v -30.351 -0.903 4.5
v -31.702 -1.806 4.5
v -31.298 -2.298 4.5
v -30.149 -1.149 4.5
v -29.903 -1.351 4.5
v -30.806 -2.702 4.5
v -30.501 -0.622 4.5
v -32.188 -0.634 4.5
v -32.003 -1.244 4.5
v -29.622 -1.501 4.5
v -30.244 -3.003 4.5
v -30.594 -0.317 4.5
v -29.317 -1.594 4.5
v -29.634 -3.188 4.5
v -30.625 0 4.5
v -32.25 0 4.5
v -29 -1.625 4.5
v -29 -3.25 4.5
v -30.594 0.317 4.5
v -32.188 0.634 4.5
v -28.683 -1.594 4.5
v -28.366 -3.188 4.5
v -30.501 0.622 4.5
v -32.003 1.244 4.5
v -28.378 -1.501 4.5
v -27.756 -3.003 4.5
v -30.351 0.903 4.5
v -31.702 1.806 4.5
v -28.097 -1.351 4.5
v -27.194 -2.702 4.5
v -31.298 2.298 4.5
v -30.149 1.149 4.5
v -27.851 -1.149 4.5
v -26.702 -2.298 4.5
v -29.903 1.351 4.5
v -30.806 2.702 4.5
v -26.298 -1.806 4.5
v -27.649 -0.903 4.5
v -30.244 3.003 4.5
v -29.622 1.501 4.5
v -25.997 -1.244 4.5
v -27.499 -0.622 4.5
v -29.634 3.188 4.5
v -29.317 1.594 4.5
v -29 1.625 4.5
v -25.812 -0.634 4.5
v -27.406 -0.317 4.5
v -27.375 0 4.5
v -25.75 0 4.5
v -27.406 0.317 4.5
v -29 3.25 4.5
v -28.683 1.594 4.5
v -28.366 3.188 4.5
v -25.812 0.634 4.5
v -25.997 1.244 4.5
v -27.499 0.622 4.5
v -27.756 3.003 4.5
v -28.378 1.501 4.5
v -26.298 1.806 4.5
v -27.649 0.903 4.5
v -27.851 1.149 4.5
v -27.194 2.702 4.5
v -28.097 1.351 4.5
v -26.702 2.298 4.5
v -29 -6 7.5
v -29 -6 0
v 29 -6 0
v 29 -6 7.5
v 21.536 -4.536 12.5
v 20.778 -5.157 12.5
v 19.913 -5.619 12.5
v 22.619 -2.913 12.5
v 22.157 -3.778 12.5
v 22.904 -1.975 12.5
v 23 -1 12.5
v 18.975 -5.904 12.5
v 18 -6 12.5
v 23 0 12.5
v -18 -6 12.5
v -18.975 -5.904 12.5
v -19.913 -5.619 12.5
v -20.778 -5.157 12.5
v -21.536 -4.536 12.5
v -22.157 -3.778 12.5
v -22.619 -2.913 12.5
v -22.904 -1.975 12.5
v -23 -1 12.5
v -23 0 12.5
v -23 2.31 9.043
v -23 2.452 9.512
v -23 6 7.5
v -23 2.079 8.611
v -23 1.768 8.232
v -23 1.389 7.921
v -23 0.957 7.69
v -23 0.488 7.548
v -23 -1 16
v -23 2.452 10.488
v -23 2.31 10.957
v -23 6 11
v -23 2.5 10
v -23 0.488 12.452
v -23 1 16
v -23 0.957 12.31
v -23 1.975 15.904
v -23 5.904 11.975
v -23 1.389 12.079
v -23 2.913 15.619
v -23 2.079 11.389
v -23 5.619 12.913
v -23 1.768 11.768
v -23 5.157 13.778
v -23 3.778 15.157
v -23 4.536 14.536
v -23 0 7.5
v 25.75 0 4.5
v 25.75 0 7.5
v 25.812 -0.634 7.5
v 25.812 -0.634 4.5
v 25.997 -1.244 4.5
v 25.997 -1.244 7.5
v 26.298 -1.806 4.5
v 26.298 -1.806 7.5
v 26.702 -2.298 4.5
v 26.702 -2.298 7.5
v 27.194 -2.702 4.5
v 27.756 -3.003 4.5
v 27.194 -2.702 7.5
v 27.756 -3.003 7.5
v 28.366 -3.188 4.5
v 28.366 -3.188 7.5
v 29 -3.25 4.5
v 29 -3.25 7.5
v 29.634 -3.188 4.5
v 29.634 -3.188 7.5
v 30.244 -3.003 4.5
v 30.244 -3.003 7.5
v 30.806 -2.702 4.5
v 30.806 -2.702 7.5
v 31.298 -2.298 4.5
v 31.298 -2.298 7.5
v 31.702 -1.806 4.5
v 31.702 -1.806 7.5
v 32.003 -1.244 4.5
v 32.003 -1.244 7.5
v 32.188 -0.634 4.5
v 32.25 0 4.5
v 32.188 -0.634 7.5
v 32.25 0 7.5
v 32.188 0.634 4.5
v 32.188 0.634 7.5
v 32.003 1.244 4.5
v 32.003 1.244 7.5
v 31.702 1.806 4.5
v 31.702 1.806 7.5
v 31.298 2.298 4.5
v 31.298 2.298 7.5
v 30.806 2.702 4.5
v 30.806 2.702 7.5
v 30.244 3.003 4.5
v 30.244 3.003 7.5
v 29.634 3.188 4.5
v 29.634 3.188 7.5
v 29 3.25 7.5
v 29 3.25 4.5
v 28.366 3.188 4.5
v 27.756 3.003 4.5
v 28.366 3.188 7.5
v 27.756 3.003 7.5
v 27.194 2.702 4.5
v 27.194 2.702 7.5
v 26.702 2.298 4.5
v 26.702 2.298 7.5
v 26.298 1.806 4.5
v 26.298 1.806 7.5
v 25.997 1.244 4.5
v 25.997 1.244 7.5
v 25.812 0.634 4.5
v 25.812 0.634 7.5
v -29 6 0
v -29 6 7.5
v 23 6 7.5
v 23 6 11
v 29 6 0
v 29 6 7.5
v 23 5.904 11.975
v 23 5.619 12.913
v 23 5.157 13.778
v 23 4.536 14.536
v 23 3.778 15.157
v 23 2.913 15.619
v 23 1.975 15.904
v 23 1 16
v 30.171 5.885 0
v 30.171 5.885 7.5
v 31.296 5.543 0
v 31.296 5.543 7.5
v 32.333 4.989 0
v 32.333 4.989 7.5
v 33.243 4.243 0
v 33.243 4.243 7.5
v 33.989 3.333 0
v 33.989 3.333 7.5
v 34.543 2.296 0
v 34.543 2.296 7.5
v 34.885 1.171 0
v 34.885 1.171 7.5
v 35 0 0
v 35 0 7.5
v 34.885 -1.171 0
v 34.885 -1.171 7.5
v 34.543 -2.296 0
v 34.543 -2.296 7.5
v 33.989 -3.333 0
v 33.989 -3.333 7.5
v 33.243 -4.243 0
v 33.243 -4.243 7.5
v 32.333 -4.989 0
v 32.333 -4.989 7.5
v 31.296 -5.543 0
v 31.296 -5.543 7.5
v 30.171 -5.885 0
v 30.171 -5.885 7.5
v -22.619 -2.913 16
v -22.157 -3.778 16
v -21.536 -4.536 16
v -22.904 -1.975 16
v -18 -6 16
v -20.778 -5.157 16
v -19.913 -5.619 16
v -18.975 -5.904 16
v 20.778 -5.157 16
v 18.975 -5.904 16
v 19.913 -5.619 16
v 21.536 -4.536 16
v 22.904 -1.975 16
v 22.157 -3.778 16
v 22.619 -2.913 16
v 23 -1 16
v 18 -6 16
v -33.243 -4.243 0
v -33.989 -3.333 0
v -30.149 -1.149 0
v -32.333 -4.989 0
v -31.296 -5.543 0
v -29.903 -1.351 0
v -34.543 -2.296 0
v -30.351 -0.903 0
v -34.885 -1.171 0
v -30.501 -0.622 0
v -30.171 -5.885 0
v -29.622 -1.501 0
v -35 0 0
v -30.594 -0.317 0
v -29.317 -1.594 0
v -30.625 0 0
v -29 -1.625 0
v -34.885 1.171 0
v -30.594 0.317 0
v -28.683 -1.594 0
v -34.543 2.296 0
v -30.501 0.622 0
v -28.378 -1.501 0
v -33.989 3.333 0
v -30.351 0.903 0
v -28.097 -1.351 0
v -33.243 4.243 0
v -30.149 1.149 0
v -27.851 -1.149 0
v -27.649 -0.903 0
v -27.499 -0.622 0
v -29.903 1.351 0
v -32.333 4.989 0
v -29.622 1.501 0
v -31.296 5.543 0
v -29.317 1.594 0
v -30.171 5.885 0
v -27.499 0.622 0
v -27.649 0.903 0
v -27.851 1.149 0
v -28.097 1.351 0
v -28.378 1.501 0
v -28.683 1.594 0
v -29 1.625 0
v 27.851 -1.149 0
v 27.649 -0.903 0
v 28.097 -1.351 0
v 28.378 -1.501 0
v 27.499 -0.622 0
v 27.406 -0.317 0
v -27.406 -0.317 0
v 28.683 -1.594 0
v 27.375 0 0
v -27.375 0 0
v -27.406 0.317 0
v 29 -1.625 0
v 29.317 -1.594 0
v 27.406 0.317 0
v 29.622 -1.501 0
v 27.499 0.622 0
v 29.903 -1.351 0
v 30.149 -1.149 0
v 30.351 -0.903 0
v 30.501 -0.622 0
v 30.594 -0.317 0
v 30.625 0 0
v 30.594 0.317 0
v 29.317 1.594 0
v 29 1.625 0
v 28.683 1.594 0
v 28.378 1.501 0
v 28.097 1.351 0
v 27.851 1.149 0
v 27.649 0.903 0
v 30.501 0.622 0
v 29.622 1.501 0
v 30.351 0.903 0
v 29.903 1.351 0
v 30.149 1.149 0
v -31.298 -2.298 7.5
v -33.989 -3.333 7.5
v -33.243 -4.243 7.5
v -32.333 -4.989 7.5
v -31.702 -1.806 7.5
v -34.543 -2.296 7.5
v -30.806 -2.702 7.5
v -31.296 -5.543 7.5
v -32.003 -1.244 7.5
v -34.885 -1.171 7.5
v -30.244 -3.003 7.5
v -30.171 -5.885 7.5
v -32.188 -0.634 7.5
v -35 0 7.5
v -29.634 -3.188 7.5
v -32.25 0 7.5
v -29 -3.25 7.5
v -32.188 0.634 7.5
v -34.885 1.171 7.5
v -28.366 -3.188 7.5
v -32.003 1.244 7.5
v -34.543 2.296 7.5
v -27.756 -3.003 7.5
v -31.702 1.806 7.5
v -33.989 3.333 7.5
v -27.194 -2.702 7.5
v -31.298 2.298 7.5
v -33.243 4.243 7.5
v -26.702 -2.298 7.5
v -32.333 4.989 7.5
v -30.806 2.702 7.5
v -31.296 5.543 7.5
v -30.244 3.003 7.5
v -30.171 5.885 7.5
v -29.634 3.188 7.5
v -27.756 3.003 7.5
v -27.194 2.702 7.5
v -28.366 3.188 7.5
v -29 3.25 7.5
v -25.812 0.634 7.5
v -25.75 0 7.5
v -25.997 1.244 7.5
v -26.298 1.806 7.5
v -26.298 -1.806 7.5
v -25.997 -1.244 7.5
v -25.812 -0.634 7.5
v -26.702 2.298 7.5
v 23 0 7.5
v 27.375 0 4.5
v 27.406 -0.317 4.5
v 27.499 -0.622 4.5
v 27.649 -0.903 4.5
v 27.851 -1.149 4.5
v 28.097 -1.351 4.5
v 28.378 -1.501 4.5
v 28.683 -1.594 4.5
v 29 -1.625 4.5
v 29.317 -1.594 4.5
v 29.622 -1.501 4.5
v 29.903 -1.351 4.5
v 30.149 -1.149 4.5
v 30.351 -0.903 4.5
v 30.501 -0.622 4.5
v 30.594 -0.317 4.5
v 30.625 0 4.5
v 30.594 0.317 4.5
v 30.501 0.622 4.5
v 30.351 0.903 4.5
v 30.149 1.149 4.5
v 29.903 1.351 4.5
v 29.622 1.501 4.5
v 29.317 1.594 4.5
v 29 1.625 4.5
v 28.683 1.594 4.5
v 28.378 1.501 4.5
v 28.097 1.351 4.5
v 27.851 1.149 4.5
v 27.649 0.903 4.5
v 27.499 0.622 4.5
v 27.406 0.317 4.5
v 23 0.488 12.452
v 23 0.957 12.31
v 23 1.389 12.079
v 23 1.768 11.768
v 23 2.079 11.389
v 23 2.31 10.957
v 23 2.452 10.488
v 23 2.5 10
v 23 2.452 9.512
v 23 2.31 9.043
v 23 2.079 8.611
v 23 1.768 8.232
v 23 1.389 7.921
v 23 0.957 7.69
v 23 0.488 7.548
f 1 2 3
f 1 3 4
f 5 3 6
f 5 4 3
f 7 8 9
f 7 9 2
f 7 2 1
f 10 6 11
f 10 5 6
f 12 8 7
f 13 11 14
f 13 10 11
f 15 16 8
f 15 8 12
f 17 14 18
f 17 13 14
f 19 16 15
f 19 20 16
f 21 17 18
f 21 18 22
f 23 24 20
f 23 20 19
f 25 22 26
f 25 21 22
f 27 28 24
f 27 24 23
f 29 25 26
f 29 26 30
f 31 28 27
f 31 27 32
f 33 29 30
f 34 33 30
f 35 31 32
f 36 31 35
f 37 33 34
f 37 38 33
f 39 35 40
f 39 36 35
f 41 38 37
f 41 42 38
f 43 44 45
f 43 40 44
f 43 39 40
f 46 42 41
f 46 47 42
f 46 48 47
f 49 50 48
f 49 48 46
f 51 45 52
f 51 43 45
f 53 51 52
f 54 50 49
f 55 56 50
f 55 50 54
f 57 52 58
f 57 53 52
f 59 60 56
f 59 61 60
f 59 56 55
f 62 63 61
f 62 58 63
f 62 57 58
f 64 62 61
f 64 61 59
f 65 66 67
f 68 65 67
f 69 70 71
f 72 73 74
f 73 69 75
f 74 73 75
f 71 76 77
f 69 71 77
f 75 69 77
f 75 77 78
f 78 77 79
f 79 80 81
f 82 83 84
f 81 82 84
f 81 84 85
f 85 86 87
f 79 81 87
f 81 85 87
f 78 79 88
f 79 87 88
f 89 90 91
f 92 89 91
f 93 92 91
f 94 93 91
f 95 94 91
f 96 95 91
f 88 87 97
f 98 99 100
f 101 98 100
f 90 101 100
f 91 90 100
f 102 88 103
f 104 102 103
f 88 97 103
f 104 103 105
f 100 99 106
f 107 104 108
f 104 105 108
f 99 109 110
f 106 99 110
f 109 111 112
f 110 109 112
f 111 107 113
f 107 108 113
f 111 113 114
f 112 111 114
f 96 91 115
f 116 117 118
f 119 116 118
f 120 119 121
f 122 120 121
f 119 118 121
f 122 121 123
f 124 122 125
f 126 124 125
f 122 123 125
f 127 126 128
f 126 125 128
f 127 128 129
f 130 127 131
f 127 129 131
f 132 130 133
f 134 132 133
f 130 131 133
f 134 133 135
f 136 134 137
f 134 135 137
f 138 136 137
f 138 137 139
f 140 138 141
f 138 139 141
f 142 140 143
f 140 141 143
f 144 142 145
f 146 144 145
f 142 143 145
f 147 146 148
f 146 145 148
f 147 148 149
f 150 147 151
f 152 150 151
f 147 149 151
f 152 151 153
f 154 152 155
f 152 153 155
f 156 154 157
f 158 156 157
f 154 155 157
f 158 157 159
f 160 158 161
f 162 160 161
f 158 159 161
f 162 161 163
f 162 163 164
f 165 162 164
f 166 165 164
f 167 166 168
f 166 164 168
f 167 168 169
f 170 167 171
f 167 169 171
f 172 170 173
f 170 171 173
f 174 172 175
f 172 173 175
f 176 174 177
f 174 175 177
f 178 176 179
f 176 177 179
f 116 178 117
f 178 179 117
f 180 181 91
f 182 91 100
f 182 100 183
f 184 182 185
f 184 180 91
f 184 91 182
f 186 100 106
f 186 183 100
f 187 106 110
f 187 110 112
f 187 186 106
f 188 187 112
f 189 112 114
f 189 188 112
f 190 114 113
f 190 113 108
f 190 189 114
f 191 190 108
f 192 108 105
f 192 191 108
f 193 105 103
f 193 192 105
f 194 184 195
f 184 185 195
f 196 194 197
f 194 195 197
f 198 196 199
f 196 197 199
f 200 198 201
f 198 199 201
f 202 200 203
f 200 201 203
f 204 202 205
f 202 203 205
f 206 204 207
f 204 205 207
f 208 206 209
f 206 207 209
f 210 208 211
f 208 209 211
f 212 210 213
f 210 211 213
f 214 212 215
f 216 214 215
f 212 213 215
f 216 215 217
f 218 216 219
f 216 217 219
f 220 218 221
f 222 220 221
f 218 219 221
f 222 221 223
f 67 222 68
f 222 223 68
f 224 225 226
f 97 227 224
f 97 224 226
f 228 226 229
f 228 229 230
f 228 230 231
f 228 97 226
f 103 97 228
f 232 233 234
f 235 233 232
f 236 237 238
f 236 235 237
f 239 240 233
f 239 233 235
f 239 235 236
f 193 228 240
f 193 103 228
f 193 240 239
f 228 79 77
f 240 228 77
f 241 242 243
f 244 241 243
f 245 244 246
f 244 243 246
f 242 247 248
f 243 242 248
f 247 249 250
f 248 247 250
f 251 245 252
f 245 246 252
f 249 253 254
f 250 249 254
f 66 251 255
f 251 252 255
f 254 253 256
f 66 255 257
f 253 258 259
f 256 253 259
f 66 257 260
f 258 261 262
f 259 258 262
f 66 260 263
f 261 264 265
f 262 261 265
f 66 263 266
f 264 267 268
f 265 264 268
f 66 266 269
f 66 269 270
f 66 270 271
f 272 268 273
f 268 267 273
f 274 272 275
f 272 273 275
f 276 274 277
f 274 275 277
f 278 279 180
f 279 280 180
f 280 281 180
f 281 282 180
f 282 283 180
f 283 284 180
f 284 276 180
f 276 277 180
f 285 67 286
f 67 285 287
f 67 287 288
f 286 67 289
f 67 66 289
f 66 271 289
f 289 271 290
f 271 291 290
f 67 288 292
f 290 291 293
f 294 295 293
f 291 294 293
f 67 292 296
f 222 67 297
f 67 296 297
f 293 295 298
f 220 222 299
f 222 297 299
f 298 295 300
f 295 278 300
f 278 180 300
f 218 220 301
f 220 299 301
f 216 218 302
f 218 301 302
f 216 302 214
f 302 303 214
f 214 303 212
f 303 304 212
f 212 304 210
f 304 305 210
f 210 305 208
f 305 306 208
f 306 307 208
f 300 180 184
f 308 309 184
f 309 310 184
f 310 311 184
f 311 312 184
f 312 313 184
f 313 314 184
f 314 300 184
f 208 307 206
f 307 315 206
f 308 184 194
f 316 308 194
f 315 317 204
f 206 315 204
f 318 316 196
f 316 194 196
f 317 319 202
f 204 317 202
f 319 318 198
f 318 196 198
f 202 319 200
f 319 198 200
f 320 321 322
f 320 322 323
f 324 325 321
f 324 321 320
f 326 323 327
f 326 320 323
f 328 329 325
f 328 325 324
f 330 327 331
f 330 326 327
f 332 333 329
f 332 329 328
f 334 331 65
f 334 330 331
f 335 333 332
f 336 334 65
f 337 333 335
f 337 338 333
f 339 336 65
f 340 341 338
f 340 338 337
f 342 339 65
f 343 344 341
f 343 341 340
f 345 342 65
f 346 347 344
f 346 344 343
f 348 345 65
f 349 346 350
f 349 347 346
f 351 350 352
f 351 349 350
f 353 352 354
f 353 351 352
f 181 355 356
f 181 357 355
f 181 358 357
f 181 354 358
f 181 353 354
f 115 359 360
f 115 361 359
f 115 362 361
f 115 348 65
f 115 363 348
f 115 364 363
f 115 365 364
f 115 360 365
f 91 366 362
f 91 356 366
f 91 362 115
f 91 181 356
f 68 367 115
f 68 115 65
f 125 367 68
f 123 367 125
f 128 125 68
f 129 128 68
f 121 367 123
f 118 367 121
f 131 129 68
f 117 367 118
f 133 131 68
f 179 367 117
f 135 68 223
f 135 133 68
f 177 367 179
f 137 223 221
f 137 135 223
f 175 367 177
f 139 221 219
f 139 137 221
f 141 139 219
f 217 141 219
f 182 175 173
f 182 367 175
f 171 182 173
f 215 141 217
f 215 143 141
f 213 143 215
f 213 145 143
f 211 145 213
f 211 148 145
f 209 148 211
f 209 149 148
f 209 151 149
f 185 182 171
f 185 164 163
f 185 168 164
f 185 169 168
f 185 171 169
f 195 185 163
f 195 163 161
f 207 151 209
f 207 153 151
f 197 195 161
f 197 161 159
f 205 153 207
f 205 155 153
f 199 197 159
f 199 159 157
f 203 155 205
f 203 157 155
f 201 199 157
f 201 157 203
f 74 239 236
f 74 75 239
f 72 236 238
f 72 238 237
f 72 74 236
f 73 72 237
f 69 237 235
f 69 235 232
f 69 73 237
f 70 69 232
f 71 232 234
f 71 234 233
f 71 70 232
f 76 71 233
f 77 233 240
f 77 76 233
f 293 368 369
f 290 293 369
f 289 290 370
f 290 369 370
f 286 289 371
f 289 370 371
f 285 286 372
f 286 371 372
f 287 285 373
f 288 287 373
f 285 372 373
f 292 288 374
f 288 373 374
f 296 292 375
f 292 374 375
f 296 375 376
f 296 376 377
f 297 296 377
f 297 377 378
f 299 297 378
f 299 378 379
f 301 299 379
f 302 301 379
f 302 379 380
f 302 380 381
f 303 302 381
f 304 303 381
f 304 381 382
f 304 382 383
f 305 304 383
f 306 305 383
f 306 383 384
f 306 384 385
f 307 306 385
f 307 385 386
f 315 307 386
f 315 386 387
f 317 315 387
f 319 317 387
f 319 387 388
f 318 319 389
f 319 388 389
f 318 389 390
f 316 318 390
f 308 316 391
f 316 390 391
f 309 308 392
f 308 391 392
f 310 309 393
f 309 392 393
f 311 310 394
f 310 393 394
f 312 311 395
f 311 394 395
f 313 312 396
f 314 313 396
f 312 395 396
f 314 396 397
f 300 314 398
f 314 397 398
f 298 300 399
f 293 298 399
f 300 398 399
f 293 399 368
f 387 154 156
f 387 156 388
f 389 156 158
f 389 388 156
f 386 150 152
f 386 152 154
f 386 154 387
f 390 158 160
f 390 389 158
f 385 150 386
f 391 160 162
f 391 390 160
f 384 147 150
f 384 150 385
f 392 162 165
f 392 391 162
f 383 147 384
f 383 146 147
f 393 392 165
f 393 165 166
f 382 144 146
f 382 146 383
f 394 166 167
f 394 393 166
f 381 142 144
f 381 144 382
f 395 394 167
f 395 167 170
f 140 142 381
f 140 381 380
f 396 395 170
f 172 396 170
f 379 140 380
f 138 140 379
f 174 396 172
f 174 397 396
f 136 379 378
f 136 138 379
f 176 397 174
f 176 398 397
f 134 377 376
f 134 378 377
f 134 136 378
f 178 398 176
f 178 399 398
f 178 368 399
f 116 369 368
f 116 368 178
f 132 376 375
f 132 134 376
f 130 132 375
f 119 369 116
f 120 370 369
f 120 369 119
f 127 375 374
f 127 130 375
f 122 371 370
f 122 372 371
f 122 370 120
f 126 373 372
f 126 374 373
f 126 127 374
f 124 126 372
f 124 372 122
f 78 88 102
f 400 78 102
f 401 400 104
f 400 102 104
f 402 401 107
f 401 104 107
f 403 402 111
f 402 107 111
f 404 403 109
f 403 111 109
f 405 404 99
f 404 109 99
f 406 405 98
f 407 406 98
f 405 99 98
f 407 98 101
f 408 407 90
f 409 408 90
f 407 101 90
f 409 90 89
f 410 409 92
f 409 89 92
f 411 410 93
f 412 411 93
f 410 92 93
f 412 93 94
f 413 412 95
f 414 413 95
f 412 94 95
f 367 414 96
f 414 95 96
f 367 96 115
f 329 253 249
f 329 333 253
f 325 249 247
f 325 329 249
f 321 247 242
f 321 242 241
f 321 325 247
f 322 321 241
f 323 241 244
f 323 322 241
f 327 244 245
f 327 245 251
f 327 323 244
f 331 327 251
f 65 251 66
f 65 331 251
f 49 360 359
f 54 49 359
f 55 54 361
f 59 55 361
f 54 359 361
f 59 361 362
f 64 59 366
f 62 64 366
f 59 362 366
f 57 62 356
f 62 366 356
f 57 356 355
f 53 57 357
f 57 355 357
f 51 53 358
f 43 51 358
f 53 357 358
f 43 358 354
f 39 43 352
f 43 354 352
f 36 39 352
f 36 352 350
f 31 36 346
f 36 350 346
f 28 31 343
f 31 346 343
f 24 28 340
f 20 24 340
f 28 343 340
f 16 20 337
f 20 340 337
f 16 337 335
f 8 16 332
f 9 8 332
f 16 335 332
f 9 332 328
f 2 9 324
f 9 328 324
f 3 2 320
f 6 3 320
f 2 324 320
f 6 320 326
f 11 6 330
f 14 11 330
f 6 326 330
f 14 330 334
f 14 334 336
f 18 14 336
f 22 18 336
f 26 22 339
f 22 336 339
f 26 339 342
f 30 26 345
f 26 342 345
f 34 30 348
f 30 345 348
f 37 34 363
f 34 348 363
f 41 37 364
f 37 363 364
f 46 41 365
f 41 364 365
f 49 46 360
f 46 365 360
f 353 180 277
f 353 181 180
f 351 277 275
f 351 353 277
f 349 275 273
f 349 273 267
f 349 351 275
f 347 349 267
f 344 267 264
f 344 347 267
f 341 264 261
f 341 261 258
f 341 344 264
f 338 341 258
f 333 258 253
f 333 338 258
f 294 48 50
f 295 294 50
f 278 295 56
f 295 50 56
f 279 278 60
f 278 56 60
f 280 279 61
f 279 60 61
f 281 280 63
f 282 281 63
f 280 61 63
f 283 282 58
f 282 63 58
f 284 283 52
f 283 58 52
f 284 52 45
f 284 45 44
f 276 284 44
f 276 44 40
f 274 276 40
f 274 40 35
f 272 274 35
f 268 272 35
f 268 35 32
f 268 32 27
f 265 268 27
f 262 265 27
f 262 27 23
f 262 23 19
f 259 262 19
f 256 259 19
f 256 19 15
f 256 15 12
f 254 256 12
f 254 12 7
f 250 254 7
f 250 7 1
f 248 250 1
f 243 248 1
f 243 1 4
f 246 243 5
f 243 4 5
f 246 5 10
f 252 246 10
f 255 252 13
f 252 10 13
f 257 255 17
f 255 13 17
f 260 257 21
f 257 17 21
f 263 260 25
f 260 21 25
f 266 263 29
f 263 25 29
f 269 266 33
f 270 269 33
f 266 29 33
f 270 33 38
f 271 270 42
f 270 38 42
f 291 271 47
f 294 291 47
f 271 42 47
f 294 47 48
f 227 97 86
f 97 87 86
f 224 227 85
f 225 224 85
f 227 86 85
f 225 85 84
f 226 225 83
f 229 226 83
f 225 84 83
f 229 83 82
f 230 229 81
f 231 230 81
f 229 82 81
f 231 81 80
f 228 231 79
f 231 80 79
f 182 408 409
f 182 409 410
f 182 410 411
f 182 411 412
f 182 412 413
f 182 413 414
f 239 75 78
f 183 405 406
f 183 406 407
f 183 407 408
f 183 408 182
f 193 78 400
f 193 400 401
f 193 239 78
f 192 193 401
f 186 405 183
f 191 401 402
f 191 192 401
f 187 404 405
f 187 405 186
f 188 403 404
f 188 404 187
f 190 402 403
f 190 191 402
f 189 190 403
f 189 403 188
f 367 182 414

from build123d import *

# Parameters (mm, degrees)
SKETCH1_W           = 70
SKETCH1_H           = 12
BOSS_EXTRUDE1_DEPTH = 16
SKETCH2_R           = 2.5
CUT_EXTRUDE1_DEPTH  = 73.055534139
SKETCH3_W           = 5
SKETCH3_H           = 7.661898901
CUT_EXTRUDE2_DEPTH  = 73.055534139
SKETCH8_W           = 12
SKETCH8_H           = 12
CUT_EXTRUDE6_DEPTH  = 8.5
FILLET2_R           = 5
SKETCH9_R           = 1.625
CUT_EXTRUDE7_DEPTH  = 37.513696061
SKETCH10_R          = 3.25
CUT_EXTRUDE8_DEPTH  = 3
FILLET3_R           = 6
FILLET5_R           = 5


with BuildPart() as part:
    # Sketch1 → Boss-Extrude1 (new body)
    with BuildSketch(Plane.XY):
        Rectangle(SKETCH1_W, SKETCH1_H)
    extrude(amount=BOSS_EXTRUDE1_DEPTH)

    # Sketch2 → Cut-Extrude1 (cut, through all)
    with BuildSketch(Plane.ZY.offset(35)):
        with Locations((10, 0)):
            Circle(SKETCH2_R)
    extrude(amount=-CUT_EXTRUDE1_DEPTH, mode=Mode.SUBTRACT)

    # Sketch3 → Cut-Extrude2 (cut, through all)
    with BuildSketch(Plane.ZY.offset(35)):
        with Locations((10, -3.830949451)):
            Rectangle(SKETCH3_W, SKETCH3_H)
    extrude(amount=-CUT_EXTRUDE2_DEPTH, mode=Mode.SUBTRACT)

    # Sketch8 → Cut-Extrude6 (cut)
    with BuildSketch(Plane.XY.offset(16)):
        with Locations((-29, 0)):
            Rectangle(SKETCH8_W, SKETCH8_H)
        with Locations((29, 0)):
            Rectangle(SKETCH8_W, SKETCH8_H)
    extrude(amount=-CUT_EXTRUDE6_DEPTH, mode=Mode.SUBTRACT)

    # Fillet2
    fillet2_edges = [part.edges().sort_by_distance(p)[0] for p in [
        (0, 6, 16),
    ]]
    fillet(fillet2_edges, radius=FILLET2_R)

    # Sketch9 → Cut-Extrude7 (cut, through all)
    with BuildSketch(Plane.XY.offset(7.5)):
        with Locations((-29, 0)):
            Circle(SKETCH9_R)
        with Locations(Location((29, 0, 0), (0, 0, 180))):
            Circle(SKETCH9_R)
    extrude(amount=-CUT_EXTRUDE7_DEPTH, mode=Mode.SUBTRACT)

    # Sketch10 → Cut-Extrude8 (cut)
    with BuildSketch(Plane.XY.offset(7.5)):
        with Locations((-29, 0)):
            Circle(SKETCH10_R)
        with Locations(Location((29, 0, 0), (0, 0, 180))):
            Circle(SKETCH10_R)
    extrude(amount=-CUT_EXTRUDE8_DEPTH, mode=Mode.SUBTRACT)

    # Fillet3
    fillet3_edges = [part.edges().sort_by_distance(p)[0] for p in [
        (35, 6, 3.75),
        (35, -6, 3.75),
        (-35, 6, 3.75),
        (-35, -6, 3.75),
    ]]
    fillet(fillet3_edges, radius=FILLET3_R - 0.0001)  # a hair under: the kernel refuses the full size

    # Fillet5
    fillet5_edges = [part.edges().sort_by_distance(p)[0] for p in [
        (-23, -6, 14.25),
        (23, -6, 14.25),
    ]]
    fillet(fillet5_edges, radius=FILLET5_R)


solid = part.part
